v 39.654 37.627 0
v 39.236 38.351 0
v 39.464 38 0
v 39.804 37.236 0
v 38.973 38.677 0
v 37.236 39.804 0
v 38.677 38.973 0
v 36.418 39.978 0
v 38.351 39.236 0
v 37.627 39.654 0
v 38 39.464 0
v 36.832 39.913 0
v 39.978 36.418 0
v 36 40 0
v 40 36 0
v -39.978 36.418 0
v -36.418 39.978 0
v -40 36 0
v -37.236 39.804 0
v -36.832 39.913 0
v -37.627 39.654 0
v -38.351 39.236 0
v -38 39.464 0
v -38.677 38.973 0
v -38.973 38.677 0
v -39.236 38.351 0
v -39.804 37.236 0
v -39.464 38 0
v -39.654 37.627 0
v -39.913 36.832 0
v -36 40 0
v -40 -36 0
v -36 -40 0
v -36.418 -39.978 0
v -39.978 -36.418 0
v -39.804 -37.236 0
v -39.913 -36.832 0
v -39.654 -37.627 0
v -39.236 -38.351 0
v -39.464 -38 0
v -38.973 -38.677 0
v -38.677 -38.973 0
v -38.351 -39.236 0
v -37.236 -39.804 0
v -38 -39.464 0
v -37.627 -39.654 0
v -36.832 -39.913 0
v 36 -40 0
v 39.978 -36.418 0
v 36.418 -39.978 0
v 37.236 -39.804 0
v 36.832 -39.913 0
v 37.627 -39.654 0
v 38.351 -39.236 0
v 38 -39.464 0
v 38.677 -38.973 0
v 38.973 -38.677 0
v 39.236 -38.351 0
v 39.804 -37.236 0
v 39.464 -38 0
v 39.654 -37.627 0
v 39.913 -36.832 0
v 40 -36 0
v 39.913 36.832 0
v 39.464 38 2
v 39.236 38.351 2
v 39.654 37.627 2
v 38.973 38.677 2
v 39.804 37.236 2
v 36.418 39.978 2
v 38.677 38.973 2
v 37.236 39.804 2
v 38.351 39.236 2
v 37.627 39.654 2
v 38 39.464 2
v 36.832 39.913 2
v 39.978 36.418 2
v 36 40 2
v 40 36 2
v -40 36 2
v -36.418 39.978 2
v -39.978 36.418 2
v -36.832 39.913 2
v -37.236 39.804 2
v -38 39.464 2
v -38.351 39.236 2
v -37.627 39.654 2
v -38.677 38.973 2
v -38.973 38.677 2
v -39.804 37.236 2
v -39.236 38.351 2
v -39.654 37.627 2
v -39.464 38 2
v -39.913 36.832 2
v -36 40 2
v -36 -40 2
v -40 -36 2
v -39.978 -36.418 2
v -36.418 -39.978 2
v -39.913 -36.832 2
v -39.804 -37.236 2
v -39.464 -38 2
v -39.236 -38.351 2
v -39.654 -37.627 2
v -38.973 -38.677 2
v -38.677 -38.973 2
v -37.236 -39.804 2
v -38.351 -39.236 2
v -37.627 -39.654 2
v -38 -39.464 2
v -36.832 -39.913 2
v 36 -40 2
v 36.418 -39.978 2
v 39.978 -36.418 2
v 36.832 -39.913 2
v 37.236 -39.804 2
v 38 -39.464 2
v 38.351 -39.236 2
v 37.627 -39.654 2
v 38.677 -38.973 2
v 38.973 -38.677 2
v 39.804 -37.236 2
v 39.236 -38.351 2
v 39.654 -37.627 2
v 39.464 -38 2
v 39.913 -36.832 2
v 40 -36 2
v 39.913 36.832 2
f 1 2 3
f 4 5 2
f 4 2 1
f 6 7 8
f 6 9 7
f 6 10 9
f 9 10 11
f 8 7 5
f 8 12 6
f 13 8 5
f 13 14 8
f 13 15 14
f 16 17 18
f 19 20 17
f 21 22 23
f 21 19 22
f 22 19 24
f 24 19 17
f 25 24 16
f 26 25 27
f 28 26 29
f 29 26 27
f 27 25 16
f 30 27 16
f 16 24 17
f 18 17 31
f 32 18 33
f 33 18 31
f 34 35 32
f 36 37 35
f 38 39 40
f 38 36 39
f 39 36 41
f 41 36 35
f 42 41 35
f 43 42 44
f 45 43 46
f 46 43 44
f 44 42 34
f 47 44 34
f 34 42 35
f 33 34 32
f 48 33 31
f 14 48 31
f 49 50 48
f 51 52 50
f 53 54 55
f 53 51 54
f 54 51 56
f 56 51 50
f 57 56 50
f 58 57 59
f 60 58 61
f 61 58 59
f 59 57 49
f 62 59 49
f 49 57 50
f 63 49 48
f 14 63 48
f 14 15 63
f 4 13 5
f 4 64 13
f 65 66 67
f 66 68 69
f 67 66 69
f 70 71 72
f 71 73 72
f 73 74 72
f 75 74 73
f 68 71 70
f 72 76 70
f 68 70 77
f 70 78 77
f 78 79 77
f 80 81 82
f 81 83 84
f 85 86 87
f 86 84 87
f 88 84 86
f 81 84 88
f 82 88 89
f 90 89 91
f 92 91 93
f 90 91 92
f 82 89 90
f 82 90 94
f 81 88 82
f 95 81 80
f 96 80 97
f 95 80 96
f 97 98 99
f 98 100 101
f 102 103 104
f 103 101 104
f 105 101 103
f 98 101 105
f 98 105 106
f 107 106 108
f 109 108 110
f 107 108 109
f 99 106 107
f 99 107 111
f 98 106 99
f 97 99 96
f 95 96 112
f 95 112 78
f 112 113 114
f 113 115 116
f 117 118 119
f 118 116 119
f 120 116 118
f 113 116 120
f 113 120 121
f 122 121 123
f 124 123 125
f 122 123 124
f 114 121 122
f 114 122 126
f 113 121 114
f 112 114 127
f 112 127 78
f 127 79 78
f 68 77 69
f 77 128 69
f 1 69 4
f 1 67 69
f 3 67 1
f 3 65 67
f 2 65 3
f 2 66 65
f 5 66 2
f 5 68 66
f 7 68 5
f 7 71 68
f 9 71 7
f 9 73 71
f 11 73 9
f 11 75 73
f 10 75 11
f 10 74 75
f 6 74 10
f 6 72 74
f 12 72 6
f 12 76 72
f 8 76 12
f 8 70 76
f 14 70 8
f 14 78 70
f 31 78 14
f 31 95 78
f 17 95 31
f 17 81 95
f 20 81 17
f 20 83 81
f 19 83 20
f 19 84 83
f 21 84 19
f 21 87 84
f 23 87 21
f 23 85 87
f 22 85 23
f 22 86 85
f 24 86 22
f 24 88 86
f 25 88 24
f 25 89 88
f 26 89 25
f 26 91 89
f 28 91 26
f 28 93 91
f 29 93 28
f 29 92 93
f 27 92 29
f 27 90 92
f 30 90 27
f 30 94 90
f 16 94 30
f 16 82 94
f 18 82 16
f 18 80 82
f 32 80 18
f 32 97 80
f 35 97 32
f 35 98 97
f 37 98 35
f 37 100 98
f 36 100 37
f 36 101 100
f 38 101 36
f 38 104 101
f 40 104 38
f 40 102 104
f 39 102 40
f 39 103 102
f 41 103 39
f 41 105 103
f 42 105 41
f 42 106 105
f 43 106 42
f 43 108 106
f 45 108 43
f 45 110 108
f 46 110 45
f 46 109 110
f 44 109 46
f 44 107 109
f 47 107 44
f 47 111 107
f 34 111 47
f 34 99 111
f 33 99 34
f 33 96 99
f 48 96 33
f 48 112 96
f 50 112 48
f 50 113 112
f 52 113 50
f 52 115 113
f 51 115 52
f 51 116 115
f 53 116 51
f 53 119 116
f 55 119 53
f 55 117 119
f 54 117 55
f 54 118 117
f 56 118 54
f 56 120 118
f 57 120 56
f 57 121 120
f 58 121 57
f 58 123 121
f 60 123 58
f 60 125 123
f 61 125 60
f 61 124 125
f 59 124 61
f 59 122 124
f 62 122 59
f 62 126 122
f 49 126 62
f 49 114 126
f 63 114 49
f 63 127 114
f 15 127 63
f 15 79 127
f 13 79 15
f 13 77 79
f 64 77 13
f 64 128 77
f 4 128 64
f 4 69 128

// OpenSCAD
// =========================================================================
// GAST-WLAN IRMGARD - REINER QR-CODE (V6 - Ohne Text & Ohne Center-Platte)
// =========================================================================
// Dieses Skript flacht die unerwünschte Platte in der Mitte des QR-Codes ab,
// indem dieser Bereich aus der Erhebung herausgeschnitten wird.
// =========================================================================

// --- Globale Einstellungen ---
$fn = 60;

// --- Einstellbare Parameter (Maße in Millimeter) ---
qr_bilddatei = "Irmgard_Gast_WLAN QR-Code.png"; // Deine QR-Code-Bilddatei

qr_size = 70;           // Kantenlänge des QR-Codes
base_margin = 5;        // Randabstand um den QR-Code (5mm)
base_thickness = 2.0;   // Dicke der Grundplatte
qr_elevation = 1.0;     // Höhe der überstehenden Pixel

// --- Parameter für das Entfernen der Platte in der Mitte ---
// Falls noch Reste der Platte sichtbar sind, diese Werte leicht erhöhen.
mitte_breite = 25;      // Breite der flachzulegenden Zone in der Mitte (X-Achse)
mitte_laenge = 35;      // Länge der flachzulegenden Zone in der Mitte (Y-Achse)

// --- Berechnete Maße ---
base_size = qr_size + (2 * base_margin); 

// --- Hauptmodell zusammenbauen ---
union() {
    // 1. Die quadratische Grundplatte
    rounded_base(base_size, base_size, base_thickness, 4);

    // 2. Der QR-Code mit freigestellter Mitte
    translate([0, 0, base_thickness]) {
        difference() {
            // Der originale QR-Code
            qr_code_generator();
            
            // Subtraktion: Schneidet die Erhebung in der Mitte weg (wird flach wie die Grundplatte)
            cube([mitte_breite, mitte_laenge, qr_elevation * 3], center = true);
        }
    }
}

// --- Hilfsmodule ---

// Modul für die abgerundete Grundplatte
module rounded_base(w, l, h, r) {
    linear_extrude(height = h) {
        minkowski() {
            square([w - 2*r, l - 2*r], center = true);
            circle(r = r);
        }
    }
}

// Modul zum Importieren und Skalieren des QR-Codes
module qr_code_generator() {
    scale_factor_xy = qr_size / 100;
    
    scale([scale_factor_xy, scale_factor_xy, qr_elevation / 100]) {
        surface(file = qr_bilddatei, center = true, invert = true);
    }
}
